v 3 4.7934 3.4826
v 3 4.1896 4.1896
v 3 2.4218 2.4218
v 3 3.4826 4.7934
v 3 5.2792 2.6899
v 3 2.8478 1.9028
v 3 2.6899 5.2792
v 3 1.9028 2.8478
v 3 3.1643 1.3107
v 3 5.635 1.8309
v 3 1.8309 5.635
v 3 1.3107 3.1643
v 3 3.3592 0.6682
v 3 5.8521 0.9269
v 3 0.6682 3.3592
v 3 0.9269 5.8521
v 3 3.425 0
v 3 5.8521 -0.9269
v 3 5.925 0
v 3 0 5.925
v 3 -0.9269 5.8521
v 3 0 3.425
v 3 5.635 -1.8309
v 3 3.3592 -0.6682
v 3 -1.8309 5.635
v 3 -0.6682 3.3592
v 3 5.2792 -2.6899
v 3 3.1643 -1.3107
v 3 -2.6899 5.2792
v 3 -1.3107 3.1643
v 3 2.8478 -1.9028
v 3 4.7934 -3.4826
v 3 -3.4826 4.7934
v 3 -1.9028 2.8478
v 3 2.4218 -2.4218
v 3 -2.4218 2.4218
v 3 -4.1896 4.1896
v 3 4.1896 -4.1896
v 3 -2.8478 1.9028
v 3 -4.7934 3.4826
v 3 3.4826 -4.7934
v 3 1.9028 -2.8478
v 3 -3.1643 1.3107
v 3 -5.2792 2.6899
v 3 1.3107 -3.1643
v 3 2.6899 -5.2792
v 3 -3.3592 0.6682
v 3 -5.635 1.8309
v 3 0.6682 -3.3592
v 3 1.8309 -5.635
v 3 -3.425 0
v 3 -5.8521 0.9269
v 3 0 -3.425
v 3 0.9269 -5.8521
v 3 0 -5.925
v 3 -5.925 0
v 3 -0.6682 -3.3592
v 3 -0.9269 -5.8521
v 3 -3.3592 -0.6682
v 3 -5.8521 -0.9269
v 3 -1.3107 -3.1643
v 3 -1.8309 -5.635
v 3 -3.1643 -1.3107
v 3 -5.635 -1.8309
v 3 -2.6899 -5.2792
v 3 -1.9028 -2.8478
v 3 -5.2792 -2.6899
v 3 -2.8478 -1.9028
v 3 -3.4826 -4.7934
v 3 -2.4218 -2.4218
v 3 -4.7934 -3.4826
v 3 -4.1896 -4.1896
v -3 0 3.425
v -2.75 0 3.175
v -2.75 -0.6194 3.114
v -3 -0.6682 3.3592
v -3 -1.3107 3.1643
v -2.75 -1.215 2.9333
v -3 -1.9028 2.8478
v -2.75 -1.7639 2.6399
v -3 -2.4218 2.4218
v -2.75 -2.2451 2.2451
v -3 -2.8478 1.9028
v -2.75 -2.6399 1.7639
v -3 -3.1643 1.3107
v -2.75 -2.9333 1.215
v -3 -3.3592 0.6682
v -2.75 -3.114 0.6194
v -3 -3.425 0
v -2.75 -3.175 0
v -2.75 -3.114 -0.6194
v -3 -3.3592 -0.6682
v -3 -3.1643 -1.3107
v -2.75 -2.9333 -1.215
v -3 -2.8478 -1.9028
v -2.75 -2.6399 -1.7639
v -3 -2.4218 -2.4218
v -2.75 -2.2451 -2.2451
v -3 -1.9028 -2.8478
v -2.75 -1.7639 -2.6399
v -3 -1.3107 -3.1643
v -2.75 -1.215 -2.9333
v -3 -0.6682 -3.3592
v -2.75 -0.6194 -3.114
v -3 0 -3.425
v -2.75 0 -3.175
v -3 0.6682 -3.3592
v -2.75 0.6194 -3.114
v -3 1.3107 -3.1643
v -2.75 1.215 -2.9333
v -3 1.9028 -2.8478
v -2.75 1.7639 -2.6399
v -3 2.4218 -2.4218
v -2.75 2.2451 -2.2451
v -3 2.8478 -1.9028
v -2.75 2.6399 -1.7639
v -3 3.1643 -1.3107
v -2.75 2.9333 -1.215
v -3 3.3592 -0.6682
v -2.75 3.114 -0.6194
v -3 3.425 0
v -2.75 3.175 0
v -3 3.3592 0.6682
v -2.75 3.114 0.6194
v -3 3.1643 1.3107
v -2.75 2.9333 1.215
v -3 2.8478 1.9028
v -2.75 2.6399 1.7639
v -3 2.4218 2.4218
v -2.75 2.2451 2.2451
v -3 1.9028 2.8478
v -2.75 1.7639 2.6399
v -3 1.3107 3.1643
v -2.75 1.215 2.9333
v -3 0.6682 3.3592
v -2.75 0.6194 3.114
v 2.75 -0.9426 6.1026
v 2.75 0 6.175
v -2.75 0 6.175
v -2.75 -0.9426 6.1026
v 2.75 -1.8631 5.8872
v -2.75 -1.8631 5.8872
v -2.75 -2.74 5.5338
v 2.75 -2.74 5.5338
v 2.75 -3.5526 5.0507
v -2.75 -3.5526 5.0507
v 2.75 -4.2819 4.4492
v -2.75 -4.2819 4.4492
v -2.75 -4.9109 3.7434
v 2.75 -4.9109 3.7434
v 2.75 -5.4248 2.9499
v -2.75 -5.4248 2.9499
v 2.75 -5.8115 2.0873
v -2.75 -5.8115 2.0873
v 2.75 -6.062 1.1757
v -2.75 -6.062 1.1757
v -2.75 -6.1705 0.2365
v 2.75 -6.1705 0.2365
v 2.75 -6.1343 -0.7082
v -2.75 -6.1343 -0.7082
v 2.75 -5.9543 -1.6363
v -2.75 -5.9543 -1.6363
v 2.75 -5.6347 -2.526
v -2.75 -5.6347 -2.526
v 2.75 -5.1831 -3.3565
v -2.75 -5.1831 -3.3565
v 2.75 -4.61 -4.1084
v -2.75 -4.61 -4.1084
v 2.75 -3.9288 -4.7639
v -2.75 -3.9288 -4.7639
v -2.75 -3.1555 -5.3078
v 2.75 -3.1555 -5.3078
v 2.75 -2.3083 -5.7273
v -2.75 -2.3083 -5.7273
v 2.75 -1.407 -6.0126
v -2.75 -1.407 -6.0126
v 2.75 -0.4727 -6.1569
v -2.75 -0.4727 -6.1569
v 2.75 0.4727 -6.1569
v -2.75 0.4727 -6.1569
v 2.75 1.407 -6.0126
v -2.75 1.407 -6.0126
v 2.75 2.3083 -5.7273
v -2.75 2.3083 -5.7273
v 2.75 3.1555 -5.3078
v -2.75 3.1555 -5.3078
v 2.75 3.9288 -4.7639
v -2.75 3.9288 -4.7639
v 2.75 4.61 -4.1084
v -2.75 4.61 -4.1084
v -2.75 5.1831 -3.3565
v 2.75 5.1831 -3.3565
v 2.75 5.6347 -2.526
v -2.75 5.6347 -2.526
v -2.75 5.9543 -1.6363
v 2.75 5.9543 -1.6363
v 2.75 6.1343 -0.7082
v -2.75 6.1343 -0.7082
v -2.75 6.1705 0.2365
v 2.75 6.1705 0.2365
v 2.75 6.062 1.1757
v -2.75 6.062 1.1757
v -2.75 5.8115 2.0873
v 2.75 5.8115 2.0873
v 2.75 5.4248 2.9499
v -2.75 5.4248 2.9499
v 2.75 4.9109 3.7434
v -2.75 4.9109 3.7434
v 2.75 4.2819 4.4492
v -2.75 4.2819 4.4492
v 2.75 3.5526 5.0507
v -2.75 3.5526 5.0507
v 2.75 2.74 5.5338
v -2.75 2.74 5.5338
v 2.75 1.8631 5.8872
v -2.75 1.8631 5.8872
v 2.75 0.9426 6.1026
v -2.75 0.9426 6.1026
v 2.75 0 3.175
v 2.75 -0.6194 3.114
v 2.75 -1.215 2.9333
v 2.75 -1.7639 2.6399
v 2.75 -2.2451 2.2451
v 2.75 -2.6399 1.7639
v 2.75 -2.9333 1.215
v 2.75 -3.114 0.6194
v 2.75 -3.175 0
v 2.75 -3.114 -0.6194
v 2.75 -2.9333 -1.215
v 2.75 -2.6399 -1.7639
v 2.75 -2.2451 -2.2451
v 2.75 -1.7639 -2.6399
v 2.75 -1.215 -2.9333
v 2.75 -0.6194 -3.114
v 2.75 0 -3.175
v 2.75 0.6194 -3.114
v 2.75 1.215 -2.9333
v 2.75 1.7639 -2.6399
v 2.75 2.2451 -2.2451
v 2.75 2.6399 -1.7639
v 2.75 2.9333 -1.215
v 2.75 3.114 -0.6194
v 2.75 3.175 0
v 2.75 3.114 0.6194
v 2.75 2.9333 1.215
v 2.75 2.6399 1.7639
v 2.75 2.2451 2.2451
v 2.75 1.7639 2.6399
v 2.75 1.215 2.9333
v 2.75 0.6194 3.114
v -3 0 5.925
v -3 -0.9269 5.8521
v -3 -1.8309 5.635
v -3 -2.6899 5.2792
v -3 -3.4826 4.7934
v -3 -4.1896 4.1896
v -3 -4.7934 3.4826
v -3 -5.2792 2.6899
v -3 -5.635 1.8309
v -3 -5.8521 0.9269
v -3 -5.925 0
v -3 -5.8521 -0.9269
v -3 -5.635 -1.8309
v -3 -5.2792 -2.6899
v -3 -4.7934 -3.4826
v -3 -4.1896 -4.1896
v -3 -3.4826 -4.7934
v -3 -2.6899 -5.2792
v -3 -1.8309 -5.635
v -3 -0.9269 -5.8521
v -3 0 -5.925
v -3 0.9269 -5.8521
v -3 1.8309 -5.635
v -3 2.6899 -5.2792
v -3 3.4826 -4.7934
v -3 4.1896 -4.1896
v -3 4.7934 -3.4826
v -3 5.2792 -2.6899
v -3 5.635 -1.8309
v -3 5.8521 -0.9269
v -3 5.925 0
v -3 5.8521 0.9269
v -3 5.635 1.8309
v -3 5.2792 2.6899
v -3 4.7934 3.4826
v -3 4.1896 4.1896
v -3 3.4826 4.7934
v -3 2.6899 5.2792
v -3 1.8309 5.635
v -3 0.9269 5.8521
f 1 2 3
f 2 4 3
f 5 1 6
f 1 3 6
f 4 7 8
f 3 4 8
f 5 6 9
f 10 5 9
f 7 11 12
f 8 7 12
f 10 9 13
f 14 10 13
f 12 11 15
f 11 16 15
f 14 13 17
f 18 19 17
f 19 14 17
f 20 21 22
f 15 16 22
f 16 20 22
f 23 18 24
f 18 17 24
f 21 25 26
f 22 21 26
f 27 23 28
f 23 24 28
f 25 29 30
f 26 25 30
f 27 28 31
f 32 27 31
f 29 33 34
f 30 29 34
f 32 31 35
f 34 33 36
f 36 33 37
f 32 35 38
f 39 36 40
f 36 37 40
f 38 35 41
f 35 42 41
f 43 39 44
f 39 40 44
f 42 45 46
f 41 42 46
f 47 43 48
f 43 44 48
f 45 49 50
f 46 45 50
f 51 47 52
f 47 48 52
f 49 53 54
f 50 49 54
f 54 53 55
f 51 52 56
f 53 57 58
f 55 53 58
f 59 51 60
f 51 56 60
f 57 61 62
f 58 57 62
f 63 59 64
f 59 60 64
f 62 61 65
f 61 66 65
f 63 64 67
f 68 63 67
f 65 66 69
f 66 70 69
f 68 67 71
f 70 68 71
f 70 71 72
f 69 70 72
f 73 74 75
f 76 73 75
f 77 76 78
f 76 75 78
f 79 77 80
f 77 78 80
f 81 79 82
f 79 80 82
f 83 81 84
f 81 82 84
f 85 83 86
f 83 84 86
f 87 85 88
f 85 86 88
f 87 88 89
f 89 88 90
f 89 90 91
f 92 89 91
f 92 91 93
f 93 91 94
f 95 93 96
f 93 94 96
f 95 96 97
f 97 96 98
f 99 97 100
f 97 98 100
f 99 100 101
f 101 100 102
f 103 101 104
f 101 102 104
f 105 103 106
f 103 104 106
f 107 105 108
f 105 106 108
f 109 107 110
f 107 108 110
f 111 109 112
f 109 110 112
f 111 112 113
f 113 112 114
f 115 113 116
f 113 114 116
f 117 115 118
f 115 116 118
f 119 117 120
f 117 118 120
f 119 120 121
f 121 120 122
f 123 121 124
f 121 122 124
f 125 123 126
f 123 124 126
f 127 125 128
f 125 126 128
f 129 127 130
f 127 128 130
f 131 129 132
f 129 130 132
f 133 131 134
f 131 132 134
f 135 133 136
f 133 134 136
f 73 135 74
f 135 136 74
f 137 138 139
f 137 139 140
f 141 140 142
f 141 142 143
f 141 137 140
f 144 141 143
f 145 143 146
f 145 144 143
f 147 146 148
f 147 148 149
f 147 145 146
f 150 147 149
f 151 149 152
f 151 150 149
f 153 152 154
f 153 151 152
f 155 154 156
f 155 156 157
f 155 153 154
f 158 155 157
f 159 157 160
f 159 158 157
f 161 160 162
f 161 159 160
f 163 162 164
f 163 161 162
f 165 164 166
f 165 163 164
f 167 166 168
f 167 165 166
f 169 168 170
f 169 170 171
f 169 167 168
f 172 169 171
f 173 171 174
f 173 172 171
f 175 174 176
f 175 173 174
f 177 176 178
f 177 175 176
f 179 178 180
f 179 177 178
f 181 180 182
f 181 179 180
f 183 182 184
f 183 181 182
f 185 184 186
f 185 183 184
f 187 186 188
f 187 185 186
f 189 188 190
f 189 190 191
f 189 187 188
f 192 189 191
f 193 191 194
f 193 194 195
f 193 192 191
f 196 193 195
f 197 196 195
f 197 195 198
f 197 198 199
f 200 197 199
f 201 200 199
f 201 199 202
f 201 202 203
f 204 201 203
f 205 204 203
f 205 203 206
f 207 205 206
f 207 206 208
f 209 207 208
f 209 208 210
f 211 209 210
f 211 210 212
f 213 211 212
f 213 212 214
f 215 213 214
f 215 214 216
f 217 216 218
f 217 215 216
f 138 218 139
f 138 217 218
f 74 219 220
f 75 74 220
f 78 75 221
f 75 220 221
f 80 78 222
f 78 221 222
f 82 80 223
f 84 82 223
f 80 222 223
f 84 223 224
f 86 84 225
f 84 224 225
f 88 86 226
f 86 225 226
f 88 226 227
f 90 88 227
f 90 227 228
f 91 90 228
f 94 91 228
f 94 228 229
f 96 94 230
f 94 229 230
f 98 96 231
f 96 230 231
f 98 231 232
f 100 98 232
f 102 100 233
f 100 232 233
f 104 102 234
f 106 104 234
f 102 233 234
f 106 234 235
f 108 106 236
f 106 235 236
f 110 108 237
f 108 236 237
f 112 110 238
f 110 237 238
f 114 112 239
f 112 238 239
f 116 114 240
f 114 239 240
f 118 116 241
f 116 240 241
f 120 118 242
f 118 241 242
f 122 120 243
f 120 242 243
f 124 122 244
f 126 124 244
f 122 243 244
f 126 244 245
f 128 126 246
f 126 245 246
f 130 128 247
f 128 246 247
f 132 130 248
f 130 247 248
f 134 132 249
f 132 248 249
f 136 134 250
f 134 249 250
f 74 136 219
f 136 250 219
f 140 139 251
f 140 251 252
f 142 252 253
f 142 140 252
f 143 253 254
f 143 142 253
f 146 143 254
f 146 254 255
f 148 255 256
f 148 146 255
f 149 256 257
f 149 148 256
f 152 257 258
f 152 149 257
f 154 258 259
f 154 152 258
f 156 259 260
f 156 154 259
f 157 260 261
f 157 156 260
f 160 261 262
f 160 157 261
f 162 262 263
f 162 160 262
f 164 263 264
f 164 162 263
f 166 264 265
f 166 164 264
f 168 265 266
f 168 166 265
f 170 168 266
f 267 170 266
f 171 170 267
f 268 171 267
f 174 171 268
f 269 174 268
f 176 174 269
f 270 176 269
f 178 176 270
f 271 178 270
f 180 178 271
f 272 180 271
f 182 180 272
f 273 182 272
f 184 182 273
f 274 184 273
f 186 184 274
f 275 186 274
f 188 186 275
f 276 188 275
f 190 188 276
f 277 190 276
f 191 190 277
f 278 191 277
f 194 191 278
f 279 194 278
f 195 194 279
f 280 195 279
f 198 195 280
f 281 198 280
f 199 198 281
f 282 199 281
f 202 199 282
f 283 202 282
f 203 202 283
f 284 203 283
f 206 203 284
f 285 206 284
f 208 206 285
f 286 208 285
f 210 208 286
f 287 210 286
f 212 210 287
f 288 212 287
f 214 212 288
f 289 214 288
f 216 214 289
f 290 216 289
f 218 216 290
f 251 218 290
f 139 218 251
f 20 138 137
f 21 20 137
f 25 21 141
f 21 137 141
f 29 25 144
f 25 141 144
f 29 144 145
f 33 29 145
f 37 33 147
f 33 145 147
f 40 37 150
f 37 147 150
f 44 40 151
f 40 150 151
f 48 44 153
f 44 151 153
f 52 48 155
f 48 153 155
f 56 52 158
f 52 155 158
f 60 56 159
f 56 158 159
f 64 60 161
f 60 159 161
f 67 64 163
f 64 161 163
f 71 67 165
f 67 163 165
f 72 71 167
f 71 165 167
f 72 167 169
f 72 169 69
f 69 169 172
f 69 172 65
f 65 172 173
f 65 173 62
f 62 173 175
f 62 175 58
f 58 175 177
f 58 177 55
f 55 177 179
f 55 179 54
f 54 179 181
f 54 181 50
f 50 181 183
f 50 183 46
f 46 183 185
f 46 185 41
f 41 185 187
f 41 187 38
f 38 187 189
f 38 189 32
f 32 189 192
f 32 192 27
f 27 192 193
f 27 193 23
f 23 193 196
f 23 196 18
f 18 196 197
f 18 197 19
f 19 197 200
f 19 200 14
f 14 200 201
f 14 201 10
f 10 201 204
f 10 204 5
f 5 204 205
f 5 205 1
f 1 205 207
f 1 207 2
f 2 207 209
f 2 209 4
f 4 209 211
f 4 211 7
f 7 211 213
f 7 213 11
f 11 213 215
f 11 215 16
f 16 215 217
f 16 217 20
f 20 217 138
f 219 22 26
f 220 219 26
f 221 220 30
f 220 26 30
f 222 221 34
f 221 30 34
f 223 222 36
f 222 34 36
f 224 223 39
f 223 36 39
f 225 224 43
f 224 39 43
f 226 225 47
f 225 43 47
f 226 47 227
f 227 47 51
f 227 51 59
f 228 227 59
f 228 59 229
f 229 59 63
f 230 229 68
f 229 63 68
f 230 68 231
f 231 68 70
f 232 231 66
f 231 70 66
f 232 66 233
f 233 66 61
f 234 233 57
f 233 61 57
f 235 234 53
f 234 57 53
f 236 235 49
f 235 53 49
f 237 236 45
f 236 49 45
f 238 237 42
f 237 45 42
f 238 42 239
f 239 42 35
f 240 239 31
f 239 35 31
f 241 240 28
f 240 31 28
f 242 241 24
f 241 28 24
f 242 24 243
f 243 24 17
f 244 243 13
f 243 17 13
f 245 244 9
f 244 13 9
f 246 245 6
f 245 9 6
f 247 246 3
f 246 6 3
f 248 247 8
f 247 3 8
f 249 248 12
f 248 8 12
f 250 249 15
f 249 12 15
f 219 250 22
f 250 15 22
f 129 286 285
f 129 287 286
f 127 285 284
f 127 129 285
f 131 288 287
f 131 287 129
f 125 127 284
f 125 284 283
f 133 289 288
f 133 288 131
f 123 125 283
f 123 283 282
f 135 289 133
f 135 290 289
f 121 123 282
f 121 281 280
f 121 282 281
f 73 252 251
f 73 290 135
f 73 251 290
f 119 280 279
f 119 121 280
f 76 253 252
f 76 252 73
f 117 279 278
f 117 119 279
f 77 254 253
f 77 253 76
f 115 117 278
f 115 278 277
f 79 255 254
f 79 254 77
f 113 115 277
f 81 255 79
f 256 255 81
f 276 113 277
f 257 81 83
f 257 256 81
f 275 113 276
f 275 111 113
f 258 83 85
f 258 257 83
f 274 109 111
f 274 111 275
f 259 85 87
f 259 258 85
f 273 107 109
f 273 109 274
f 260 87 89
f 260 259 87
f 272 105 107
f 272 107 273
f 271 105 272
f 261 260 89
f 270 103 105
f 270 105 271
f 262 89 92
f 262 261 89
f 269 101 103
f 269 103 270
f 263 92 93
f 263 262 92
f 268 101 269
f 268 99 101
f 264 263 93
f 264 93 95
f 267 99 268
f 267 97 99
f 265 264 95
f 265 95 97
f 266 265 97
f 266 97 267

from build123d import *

# Parameters (mm, degrees)
SKETCH1_W     = 6
SKETCH1_H     = 3
CHAMFER1_SIZE = 0.25


with BuildPart() as part:
    # Sketch1 → Revolve1 (revolve)
    with BuildSketch(Plane.XY, mode=Mode.PRIVATE) as revolve1_sk:
        with Locations((0, 4.675)):
            Rectangle(SKETCH1_W, SKETCH1_H)
    revolve(revolve1_sk.sketch.rotate(Axis((0, 0, 0), (1, 0, 0)), 90), axis=Axis((0, 0, 0), (1, 0, 0)))

    # Chamfer1
    chamfer1_edges = [part.edges().sort_by_distance(p)[0] for p in [
        (-3, 0, -3.175),
        (3, 0, -3.175),
        (3, 0, -6.175),
        (-3, 0, -6.175),
    ]]
    chamfer(chamfer1_edges, length=CHAMFER1_SIZE)


solid = part.part
